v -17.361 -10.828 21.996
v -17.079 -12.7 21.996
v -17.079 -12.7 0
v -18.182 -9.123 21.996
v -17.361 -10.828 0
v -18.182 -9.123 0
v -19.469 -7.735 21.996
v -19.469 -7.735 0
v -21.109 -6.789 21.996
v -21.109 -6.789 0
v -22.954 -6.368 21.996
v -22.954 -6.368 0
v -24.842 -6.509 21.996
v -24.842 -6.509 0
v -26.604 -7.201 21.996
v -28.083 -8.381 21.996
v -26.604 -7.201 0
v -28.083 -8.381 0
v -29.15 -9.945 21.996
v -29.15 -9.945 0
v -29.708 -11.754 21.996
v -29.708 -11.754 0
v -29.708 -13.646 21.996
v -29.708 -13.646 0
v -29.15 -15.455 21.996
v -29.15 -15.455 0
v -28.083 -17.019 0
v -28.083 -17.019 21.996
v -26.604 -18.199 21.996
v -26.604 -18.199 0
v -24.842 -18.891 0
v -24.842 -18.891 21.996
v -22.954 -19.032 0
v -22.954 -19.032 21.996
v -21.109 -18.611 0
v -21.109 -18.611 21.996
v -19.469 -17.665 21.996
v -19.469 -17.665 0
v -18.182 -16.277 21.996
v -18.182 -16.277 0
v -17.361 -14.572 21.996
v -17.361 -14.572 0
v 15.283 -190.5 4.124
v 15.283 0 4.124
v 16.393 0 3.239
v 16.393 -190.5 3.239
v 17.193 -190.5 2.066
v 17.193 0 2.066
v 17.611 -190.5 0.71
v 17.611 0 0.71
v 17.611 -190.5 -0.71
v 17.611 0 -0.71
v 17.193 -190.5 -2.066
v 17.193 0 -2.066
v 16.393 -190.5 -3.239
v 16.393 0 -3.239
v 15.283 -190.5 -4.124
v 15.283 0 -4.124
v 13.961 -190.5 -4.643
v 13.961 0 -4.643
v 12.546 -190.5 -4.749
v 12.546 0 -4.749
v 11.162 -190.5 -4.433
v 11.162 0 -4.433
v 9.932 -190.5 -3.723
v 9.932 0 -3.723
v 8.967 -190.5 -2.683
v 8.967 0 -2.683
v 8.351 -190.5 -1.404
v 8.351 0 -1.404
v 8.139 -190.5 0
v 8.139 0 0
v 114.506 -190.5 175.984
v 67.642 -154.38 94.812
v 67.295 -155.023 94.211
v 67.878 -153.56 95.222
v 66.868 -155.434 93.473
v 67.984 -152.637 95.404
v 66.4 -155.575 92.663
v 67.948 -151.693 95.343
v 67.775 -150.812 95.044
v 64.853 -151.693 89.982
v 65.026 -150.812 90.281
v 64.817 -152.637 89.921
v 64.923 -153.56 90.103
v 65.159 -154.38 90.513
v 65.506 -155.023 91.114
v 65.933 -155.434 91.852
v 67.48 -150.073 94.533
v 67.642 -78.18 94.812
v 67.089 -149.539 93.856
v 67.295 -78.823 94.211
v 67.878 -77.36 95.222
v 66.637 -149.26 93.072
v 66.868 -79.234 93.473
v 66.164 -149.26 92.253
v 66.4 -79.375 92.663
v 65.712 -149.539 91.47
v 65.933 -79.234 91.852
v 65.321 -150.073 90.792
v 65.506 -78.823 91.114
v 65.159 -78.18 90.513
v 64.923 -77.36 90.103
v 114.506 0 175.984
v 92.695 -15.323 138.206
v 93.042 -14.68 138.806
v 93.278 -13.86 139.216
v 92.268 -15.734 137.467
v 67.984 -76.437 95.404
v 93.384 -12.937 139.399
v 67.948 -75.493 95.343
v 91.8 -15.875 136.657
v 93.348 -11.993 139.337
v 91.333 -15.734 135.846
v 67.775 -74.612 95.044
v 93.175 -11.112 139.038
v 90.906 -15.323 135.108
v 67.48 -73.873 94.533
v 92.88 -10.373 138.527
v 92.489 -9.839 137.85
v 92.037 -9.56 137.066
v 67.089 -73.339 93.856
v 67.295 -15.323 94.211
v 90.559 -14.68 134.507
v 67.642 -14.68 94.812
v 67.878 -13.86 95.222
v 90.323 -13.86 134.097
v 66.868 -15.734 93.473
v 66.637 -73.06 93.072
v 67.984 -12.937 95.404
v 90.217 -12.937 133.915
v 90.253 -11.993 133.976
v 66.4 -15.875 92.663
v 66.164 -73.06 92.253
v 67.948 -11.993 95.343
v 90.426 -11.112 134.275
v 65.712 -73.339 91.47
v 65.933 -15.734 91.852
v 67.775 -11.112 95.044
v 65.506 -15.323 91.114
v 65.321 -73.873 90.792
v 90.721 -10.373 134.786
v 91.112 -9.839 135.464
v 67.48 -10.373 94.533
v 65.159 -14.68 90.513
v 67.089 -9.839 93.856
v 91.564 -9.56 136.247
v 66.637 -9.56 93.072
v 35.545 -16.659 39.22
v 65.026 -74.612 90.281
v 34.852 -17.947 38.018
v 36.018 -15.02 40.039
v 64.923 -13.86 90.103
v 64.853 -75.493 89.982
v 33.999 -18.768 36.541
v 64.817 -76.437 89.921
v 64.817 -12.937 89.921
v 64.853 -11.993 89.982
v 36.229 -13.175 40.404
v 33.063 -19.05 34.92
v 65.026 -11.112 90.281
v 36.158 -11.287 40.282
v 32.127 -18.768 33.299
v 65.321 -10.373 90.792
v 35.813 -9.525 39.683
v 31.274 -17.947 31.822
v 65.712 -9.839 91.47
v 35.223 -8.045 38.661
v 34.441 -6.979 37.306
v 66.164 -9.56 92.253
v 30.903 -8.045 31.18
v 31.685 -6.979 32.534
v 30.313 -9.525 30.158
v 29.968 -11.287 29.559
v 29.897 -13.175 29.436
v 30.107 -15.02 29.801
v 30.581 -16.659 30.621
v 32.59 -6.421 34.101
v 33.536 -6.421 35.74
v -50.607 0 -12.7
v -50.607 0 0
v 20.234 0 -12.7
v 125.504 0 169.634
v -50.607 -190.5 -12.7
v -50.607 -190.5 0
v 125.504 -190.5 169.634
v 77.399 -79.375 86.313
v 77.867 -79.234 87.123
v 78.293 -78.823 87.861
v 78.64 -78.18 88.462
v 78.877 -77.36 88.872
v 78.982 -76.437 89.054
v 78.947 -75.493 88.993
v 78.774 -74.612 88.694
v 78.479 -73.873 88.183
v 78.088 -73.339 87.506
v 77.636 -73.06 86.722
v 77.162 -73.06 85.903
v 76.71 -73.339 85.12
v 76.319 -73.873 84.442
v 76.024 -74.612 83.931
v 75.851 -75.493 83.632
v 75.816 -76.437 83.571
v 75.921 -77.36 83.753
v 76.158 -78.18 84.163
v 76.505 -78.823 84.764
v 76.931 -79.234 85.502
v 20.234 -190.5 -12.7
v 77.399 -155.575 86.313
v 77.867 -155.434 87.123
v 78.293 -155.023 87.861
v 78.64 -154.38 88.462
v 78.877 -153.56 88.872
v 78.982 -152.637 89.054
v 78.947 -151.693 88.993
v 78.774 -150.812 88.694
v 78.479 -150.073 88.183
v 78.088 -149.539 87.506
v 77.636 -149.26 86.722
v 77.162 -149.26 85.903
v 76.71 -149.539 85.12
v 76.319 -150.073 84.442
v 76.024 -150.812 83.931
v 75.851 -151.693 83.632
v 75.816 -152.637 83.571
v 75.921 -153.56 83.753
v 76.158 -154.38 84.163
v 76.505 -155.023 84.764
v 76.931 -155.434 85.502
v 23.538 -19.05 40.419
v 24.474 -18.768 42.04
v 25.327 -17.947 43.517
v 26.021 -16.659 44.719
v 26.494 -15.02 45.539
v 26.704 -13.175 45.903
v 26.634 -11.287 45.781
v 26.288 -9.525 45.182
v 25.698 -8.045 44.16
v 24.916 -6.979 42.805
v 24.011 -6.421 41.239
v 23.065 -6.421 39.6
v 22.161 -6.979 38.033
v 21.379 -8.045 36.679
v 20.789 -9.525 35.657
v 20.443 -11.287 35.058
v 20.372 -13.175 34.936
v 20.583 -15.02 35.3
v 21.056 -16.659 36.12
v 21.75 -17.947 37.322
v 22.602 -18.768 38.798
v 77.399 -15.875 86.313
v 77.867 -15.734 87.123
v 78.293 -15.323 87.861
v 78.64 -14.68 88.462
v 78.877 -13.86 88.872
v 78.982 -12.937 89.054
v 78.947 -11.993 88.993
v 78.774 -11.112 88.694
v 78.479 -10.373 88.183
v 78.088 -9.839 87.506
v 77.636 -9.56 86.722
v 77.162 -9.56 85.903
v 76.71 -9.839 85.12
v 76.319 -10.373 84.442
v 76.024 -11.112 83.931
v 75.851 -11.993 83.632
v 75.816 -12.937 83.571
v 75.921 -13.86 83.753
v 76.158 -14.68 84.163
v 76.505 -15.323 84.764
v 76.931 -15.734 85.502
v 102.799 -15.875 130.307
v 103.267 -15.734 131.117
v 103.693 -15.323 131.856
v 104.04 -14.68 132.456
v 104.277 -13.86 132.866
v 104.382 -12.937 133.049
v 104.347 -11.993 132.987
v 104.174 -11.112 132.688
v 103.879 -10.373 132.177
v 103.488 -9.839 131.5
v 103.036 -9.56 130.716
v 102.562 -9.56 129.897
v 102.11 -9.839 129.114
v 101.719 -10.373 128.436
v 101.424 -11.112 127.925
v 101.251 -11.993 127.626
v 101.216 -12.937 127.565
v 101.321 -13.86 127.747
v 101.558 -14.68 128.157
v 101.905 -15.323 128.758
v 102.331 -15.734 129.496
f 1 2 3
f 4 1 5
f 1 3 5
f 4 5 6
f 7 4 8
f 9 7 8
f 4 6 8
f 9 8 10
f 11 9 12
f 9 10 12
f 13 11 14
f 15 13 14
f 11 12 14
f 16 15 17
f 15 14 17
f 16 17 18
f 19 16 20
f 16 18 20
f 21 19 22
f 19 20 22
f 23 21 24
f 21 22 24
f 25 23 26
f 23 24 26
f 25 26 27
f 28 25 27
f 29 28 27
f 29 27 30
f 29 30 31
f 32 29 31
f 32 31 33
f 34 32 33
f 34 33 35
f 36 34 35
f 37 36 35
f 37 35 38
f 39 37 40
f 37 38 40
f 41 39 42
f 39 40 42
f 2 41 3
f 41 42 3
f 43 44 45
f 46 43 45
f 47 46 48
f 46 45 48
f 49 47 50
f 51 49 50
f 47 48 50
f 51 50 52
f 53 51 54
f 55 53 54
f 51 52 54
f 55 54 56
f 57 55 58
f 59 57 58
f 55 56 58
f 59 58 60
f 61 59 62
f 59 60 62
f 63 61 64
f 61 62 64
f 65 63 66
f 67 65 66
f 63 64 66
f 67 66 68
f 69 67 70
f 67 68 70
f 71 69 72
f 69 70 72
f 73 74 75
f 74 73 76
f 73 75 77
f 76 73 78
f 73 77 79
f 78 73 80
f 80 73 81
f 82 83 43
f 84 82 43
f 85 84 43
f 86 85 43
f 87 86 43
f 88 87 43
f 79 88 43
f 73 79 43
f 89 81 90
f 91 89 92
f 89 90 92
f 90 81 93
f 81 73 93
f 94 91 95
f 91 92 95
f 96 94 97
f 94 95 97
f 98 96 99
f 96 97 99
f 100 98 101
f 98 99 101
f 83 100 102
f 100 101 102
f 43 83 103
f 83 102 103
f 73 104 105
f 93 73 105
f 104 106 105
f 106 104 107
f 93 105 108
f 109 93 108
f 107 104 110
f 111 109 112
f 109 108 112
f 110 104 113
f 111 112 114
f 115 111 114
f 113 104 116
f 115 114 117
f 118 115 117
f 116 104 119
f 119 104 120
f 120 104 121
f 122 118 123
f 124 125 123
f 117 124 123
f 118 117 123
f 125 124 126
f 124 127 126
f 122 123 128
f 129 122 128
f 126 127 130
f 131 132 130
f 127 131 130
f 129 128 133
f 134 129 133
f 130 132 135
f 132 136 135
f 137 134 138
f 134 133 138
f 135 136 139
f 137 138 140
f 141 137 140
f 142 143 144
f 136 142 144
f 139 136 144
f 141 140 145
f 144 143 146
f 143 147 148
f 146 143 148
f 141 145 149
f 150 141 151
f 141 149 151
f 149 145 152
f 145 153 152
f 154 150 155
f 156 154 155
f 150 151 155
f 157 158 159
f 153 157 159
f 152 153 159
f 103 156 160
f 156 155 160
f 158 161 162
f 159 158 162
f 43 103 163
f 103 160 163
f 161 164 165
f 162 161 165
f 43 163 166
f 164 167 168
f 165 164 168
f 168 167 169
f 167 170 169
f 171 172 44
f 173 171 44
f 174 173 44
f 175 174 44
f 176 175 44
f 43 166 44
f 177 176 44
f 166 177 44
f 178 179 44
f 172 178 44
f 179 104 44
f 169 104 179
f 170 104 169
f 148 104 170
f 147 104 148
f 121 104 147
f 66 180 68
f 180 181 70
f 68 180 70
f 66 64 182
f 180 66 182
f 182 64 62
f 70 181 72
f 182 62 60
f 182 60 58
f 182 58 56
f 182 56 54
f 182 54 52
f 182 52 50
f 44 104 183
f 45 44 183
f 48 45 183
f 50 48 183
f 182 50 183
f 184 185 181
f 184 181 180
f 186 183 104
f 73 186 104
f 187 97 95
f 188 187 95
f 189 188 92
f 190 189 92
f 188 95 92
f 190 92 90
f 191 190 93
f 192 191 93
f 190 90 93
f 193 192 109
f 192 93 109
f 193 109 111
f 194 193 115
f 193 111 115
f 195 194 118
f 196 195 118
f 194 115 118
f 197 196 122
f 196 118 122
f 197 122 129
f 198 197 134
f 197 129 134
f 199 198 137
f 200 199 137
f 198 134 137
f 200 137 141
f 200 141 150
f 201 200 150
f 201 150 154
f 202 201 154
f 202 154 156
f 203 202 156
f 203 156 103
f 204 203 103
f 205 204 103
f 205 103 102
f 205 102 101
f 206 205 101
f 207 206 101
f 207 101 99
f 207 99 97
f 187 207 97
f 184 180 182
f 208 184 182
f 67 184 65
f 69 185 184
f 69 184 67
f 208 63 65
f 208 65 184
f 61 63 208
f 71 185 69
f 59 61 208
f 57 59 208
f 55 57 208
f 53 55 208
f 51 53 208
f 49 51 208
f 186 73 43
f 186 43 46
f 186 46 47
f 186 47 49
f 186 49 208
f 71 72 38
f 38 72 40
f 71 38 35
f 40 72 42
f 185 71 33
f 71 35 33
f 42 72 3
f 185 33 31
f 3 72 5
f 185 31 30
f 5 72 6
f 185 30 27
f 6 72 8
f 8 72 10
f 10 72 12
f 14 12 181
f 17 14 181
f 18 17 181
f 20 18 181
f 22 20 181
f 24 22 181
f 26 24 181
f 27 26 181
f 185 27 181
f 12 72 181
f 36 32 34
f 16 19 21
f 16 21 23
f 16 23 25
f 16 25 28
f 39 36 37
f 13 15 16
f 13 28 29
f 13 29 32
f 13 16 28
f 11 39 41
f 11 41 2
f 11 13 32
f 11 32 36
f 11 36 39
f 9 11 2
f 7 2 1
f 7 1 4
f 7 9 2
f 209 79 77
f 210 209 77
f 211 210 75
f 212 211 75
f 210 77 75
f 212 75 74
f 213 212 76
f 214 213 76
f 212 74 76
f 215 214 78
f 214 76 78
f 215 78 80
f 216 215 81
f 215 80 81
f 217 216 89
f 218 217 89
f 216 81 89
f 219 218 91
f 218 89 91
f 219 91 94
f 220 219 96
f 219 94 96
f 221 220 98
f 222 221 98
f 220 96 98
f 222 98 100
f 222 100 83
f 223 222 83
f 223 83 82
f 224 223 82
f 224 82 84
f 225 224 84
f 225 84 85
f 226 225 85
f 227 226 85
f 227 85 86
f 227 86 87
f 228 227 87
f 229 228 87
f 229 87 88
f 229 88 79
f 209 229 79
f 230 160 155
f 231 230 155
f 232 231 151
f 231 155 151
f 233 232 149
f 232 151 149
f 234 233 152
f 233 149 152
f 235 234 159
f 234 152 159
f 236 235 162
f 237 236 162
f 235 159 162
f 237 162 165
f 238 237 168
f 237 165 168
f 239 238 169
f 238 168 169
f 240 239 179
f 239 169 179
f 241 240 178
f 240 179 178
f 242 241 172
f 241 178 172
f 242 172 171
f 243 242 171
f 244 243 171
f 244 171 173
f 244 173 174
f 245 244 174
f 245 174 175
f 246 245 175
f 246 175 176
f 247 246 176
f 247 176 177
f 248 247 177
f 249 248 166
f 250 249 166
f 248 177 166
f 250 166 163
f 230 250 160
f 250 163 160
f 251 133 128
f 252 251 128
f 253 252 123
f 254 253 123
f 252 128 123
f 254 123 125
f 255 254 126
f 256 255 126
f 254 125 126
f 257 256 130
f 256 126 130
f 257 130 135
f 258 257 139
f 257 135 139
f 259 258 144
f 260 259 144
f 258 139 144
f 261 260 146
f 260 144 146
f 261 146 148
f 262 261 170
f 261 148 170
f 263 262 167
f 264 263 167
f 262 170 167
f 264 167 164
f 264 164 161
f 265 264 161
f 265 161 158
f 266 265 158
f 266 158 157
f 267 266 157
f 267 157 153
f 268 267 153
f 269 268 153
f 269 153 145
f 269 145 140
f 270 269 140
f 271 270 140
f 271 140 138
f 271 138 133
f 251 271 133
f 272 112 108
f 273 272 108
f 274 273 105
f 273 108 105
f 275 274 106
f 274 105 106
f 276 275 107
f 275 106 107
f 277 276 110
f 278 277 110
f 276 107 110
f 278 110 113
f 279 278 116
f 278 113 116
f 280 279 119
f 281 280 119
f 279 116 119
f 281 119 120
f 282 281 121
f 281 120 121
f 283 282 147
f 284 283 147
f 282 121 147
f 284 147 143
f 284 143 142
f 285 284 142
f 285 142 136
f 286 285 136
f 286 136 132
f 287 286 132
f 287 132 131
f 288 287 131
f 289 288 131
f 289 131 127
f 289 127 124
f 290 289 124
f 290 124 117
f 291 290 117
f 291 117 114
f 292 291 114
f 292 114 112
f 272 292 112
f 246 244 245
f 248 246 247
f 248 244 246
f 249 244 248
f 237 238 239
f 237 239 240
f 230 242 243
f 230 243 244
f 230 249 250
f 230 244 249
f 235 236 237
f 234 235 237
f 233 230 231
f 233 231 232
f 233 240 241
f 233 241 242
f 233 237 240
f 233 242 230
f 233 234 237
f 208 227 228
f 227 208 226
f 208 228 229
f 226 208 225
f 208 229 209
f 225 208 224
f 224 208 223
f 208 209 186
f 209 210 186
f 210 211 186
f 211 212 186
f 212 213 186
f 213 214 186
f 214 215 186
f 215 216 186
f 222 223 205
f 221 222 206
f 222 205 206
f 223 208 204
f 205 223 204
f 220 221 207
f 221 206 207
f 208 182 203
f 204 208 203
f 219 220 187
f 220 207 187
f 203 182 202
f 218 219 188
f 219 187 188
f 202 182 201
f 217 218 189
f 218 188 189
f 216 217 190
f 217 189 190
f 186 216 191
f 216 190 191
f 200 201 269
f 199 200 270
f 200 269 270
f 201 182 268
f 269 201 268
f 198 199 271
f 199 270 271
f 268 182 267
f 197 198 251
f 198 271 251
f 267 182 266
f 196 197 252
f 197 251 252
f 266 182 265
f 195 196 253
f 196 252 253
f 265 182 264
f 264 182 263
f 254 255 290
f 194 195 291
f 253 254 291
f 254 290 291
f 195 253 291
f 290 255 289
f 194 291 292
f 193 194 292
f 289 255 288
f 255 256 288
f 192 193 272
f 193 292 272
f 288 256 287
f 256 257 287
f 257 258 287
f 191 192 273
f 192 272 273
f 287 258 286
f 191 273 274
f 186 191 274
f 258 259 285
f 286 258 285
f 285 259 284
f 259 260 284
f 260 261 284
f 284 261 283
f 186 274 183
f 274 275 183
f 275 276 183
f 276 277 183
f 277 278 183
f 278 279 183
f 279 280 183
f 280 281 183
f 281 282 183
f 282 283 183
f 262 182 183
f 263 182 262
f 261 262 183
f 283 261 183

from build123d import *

# Parameters (mm, degrees)
F1_DEPTH = 190.5
F2_R     = 6.35
F3_DEPTH = 21.9964
F4_R     = 3.175
F5_DEPTH = 103.867754064
F6_R     = 6.35
F7_DEPTH = 10.9982


with BuildPart() as f1:
    # F0 (on Front) → F1 (new body)
    with BuildSketch(Plane.XZ):
        with BuildLine():
            Line((8.139213971, 0), (-50.6065376103, 0))
            Line((-50.6065376103, 0), (-50.6065376103, -12.7))
            Line((-50.6065376103, -12.7), (20.2340623897, -12.7))
            Line((20.2340623897, -12.7), (125.5043623897, 169.633508128))
            Line((125.5043623897, 169.633508128), (114.5058397616, 175.983508128))
            Line((114.5058397616, 175.983508128), (15.282963971, 4.1244459855))
            ThreePointArc((15.282963971, 4.1244459855), (15.282963971, -4.1244459855), (8.139213971, 0))
        make_face()
    extrude(amount=F1_DEPTH)

    # F2 (on face) → F3 (join)
    with BuildSketch(Plane.XY):
        with Locations((-23.4285376103, -12.7)):
            Circle(F2_R)
    extrude(amount=F3_DEPTH)

    # F4 (on face) → F5 (cut, through all)
    with BuildSketch(Plane(origin=(9.6762854782, 0, -5.5866060256), x_dir=(0, -1, 0), z_dir=(-0.8660254038, 0, 0.5))):
        with Locations((152.4, 113.4483569855)):
            Circle(F4_R)
        with Locations((76.2, 113.4483569855)):
            Circle(F4_R)
        with Locations((12.7, 113.4483569855)):
            Circle(F4_R)
        with Locations((12.7, 164.2483569855)):
            Circle(F4_R)
    extrude(amount=-F5_DEPTH, mode=Mode.SUBTRACT)

    # F6 (on face) → F7 (join)
    with BuildSketch(Plane(origin=(9.6762854782, 0, -5.5866060256), x_dir=(0, -1, 0), z_dir=(-0.8660254038, 0, 0.5))):
        with Locations((12.7, 46.7733569855)):
            Circle(F6_R)
    extrude(amount=F7_DEPTH)


solid = f1.part
